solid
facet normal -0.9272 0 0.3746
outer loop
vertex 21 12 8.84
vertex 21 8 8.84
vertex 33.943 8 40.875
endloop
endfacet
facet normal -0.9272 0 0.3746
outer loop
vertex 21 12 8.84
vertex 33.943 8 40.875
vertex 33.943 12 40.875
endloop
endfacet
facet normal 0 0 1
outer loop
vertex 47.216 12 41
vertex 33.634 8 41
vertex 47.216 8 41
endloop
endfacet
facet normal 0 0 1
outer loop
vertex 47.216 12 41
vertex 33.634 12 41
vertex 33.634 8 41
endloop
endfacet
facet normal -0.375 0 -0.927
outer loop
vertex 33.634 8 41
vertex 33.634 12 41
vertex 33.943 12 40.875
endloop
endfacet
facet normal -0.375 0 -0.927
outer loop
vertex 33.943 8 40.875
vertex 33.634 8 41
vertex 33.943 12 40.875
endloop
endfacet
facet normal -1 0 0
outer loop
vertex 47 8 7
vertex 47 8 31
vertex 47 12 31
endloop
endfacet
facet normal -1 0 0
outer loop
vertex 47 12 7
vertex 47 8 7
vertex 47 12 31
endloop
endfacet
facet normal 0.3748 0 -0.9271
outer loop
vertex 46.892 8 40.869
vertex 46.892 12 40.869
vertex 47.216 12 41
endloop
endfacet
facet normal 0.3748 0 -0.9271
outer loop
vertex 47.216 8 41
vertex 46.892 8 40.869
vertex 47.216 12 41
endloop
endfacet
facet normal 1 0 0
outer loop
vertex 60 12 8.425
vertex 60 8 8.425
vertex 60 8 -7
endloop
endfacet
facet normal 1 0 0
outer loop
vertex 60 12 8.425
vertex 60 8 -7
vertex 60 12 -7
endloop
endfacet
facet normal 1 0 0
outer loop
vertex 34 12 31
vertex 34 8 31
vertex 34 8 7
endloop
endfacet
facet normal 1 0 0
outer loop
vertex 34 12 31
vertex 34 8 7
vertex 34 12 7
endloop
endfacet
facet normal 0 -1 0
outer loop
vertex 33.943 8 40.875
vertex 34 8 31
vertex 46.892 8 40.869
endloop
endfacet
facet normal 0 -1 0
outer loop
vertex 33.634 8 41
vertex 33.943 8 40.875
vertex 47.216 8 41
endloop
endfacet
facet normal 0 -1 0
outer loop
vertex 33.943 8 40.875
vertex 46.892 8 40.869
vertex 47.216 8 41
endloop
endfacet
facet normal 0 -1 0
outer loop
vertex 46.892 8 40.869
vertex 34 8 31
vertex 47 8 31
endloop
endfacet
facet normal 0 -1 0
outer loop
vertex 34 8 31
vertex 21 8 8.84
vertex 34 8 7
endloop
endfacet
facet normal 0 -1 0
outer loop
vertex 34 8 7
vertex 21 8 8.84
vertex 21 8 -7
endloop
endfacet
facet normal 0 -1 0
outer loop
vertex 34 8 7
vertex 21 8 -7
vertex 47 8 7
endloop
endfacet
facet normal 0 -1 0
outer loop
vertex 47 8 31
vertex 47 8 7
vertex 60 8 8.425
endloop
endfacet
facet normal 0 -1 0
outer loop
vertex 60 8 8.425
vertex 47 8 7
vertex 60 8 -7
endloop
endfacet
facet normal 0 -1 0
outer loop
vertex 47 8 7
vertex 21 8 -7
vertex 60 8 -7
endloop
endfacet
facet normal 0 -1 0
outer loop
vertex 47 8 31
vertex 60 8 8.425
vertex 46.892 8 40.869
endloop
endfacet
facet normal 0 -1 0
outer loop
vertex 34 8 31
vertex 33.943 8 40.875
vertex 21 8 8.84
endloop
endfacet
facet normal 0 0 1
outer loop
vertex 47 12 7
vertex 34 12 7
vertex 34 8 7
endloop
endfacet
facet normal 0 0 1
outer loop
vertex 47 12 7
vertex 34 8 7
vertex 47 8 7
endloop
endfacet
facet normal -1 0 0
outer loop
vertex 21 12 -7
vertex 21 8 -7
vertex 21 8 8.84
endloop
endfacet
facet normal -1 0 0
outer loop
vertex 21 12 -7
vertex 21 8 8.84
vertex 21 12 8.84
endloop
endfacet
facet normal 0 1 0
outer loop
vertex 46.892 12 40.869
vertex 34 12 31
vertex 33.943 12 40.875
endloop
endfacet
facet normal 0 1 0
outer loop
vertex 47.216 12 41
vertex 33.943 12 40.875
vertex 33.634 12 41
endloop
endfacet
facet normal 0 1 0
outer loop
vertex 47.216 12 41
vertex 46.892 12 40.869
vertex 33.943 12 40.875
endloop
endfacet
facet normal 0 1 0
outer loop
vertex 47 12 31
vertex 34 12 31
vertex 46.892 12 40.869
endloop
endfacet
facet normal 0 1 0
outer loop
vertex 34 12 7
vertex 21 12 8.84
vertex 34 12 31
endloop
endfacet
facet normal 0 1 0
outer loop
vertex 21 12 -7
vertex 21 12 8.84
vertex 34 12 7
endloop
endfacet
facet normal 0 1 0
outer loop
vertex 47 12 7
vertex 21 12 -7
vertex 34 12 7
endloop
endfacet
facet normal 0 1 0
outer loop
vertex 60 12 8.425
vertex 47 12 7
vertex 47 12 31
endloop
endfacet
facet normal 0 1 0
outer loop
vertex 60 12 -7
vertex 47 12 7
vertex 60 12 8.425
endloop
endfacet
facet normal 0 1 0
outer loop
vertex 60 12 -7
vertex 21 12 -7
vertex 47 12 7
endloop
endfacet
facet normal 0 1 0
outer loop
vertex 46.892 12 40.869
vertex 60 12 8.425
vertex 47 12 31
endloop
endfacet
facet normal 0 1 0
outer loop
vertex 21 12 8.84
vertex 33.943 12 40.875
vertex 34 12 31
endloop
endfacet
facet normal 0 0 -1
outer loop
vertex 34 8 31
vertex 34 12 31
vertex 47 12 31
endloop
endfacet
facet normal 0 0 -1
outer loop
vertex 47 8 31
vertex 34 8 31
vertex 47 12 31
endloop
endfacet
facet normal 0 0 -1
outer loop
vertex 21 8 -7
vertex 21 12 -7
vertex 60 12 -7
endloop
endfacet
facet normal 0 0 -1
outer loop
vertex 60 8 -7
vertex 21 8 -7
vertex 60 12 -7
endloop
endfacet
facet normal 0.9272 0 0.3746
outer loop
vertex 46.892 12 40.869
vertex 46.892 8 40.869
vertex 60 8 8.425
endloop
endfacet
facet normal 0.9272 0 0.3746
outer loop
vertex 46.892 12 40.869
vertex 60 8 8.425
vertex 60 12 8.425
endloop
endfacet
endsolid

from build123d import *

# Parameters (mm, degrees)
BOX012_W               = 16
BOX012_H               = 4
BOX012_DEPTH           = 43
BOX012_PLACEMENT_ANGLE = 22
BOX011_W               = 16
BOX011_H               = 4
BOX011_DEPTH           = 43
BOX011_PLACEMENT_ANGLE = 22
BOX008_W               = 13
BOX008_H               = 4
BOX008_DEPTH           = 34
BOX009_W               = 13
BOX009_H               = 4
BOX009_DEPTH           = 34
BOX010_W               = 13
BOX010_H               = 4
BOX010_DEPTH           = 10
BOX007_W               = 39
BOX007_H               = 4
BOX007_DEPTH           = 14


with BuildPart() as w_rfel012:
    # Box012 → Box012 (new body)
    with BuildSketch(Plane.XY):
        with Locations((8, 2)):
            Rectangle(BOX012_W, BOX012_H)
    extrude(amount=BOX012_DEPTH)


with BuildPart() as w_rfel012_1:
    # Box012 placement: moved
    add(w_rfel012.part.moved(Location((42, 0, 8))).rotate(Axis((42, 0, 8), (0, -1, 0)), BOX012_PLACEMENT_ANGLE))


with BuildPart() as fusion008:
    # Box011 → Box011 (new body)
    with BuildSketch(Plane.XY):
        with Locations((8, 2)):
            Rectangle(BOX011_W, BOX011_H)
    extrude(amount=BOX011_DEPTH)


with BuildPart() as fusion008_1:
    # Box011 placement: moved
    add(fusion008.part.moved(Location((-18, 0, 14))).rotate(Axis((-18, 0, 14), (0, 1, 0)), BOX011_PLACEMENT_ANGLE))

    # Fusion008: union Würfel012
    add(w_rfel012_1.part)


with BuildPart() as w_rfel008:
    # Box008 → Box008 (new body)
    with BuildSketch(Plane.XY.offset(14)):
        with Locations((6.5, 2)):
            Rectangle(BOX008_W, BOX008_H)
    extrude(amount=BOX008_DEPTH)


with BuildPart() as w_rfel009:
    # Box009 → Box009 (new body)
    with BuildSketch(Plane(origin=(26, 0, 14), x_dir=(1, 0, 0), z_dir=(0, 0, 1))):
        with Locations((6.5, 2)):
            Rectangle(BOX009_W, BOX009_H)
    extrude(amount=BOX009_DEPTH)


with BuildPart() as w_rfel010:
    # Box010 → Box010 (new body)
    with BuildSketch(Plane(origin=(13, 0, 38), x_dir=(1, 0, 0), z_dir=(0, 0, 1))):
        with Locations((6.5, 2)):
            Rectangle(BOX010_W, BOX010_H)
    extrude(amount=BOX010_DEPTH)


with BuildPart() as cut003:
    # Box007 → Box007 (new body)
    with BuildSketch(Plane.XY):
        with Locations((19.5, 2)):
            Rectangle(BOX007_W, BOX007_H)
    extrude(amount=BOX007_DEPTH)

    # Fusion007: union Würfel008, Würfel009, Würfel010
    add(w_rfel008.part)
    add(w_rfel009.part)
    add(w_rfel010.part)

    # Cut003: cut Fusion008
    add(fusion008_1.part, mode=Mode.SUBTRACT)


with BuildPart() as cut003_1:
    # Cut003 placement: moved
    add(cut003.part.moved(Location((21, 8, -7))))


solid = cut003_1.part
